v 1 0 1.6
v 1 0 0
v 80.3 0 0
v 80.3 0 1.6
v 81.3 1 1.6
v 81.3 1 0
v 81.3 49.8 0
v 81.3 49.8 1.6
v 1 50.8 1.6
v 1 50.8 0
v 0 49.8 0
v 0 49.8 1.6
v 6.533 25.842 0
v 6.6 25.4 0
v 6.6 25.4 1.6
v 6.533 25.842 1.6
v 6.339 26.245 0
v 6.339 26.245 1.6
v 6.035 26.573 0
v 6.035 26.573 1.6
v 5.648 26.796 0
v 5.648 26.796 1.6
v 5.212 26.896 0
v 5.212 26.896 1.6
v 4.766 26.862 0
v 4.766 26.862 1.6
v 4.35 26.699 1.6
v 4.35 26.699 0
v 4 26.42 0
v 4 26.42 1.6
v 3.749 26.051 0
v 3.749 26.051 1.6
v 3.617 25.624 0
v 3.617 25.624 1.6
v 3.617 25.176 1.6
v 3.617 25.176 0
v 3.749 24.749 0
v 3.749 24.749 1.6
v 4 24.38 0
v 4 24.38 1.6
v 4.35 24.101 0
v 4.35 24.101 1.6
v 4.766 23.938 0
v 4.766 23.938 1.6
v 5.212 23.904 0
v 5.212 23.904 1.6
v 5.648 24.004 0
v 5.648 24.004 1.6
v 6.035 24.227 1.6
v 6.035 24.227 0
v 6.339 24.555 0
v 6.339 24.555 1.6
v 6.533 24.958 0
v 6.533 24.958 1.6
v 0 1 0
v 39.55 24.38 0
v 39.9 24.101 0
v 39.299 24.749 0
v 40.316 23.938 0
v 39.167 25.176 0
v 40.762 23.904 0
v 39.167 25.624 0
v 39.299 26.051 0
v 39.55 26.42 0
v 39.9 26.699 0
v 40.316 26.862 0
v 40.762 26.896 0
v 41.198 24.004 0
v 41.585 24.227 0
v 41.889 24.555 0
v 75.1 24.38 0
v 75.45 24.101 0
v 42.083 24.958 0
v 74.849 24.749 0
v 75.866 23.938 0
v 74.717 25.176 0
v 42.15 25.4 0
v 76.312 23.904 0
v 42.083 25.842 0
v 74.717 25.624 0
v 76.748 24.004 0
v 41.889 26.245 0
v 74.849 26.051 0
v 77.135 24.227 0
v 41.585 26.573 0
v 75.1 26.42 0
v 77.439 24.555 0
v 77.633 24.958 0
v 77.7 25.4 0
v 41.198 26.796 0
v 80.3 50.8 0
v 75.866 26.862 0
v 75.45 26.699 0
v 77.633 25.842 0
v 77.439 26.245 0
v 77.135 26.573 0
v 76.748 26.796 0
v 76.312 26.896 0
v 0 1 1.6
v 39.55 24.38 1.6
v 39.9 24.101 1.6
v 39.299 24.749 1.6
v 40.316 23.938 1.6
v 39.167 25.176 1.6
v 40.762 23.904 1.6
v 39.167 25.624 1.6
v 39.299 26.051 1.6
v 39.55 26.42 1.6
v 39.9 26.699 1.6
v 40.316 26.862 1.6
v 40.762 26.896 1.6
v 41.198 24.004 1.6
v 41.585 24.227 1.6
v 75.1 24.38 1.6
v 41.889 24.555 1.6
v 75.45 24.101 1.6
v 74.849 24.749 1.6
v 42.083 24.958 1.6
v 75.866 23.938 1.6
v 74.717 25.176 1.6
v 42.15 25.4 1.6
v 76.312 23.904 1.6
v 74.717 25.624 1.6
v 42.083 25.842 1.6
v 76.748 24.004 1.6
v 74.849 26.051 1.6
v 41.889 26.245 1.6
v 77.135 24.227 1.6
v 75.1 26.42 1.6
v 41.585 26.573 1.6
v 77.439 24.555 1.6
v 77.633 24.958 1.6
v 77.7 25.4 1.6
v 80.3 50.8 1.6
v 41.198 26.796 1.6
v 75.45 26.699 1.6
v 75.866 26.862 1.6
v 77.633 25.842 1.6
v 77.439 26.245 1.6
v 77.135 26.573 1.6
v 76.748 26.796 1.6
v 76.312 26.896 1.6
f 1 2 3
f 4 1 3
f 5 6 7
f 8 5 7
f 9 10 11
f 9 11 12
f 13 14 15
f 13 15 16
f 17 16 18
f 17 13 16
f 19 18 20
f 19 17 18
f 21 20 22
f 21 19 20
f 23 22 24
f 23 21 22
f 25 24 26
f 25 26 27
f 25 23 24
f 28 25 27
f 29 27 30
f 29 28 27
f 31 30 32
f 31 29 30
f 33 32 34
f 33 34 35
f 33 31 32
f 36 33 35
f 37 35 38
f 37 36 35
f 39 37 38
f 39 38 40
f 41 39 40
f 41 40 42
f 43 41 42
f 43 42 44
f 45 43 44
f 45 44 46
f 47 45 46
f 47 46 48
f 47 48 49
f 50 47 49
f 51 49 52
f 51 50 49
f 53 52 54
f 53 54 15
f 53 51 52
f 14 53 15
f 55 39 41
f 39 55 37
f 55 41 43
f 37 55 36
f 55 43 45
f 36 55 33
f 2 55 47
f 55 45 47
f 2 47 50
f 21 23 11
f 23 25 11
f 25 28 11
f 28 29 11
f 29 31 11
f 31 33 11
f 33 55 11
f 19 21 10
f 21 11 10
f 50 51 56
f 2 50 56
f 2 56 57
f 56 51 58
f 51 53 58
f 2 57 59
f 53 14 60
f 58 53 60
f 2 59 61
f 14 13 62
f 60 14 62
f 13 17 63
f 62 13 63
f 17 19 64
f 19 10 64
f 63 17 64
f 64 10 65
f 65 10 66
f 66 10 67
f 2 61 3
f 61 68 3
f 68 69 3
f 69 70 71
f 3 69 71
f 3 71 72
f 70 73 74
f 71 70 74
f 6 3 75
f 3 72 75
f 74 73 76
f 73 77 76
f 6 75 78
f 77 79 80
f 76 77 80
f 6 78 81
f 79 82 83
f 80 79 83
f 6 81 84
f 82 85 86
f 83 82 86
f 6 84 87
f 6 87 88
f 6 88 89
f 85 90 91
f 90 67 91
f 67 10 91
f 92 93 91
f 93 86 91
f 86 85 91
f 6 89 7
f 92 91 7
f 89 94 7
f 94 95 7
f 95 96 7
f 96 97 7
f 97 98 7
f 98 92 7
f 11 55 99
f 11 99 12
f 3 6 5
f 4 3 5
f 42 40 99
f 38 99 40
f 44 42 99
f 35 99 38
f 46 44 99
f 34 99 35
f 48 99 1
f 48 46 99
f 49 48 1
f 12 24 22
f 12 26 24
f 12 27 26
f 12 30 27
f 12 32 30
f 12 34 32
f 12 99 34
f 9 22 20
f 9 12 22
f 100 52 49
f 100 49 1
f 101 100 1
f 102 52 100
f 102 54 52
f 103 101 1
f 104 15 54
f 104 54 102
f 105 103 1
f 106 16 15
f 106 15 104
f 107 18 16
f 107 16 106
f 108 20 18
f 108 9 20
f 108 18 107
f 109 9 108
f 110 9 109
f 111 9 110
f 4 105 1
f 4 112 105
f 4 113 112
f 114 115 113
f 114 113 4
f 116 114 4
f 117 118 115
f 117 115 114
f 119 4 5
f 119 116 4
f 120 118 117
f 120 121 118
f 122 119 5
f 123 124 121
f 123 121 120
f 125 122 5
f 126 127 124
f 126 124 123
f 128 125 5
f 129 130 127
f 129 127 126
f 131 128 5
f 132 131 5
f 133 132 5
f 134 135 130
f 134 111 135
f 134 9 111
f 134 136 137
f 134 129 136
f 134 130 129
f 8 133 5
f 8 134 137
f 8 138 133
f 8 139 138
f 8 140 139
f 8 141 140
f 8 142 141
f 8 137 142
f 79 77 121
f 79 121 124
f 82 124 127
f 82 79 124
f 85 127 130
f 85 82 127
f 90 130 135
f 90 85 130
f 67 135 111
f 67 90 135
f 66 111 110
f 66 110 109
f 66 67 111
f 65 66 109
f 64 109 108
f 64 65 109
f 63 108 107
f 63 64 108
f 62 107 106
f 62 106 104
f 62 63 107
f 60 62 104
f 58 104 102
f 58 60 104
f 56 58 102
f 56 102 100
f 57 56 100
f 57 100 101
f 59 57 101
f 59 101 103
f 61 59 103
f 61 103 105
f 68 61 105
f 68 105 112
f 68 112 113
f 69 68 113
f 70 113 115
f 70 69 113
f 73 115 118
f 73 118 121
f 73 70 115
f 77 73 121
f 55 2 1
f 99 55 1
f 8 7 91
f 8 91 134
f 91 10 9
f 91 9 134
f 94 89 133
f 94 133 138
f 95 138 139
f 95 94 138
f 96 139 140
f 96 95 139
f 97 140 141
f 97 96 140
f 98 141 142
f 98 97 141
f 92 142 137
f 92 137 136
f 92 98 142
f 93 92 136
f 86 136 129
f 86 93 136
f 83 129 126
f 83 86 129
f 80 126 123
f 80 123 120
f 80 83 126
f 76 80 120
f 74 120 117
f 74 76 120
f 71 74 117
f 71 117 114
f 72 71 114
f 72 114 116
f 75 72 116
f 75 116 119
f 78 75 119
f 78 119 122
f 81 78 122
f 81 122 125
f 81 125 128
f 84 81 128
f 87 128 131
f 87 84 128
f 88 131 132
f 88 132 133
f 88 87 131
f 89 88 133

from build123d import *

# Parameters (mm, degrees)
SKETCH1_W           = 81.3
SKETCH1_H           = 50.8
SKETCH1_R           = 1.5
BOSS_EXTRUDE1_DEPTH = 1.6
CHAMFER1_SIZE       = 1


with BuildPart() as part:
    # Sketch1 → Boss-Extrude1 (new body)
    with BuildSketch(Plane.XY):
        with Locations((40.65, 25.4)):
            Rectangle(SKETCH1_W, SKETCH1_H)
        with Locations((5.1, 25.4)):
            Circle(SKETCH1_R, mode=Mode.SUBTRACT)
        with Locations((40.65, 25.4)):
            Circle(SKETCH1_R, mode=Mode.SUBTRACT)
        with Locations((76.2, 25.4)):
            Circle(SKETCH1_R, mode=Mode.SUBTRACT)
    extrude(amount=BOSS_EXTRUDE1_DEPTH)

    # Chamfer1
    chamfer1_edges = [part.edges().sort_by_distance(p)[0] for p in [
        (0, 50.8, 0.8),
        (81.3, 50.8, 0.8),
        (81.3, 0, 0.8),
        (0, 0, 0.8),
    ]]
    chamfer(chamfer1_edges, length=CHAMFER1_SIZE)


solid = part.part
